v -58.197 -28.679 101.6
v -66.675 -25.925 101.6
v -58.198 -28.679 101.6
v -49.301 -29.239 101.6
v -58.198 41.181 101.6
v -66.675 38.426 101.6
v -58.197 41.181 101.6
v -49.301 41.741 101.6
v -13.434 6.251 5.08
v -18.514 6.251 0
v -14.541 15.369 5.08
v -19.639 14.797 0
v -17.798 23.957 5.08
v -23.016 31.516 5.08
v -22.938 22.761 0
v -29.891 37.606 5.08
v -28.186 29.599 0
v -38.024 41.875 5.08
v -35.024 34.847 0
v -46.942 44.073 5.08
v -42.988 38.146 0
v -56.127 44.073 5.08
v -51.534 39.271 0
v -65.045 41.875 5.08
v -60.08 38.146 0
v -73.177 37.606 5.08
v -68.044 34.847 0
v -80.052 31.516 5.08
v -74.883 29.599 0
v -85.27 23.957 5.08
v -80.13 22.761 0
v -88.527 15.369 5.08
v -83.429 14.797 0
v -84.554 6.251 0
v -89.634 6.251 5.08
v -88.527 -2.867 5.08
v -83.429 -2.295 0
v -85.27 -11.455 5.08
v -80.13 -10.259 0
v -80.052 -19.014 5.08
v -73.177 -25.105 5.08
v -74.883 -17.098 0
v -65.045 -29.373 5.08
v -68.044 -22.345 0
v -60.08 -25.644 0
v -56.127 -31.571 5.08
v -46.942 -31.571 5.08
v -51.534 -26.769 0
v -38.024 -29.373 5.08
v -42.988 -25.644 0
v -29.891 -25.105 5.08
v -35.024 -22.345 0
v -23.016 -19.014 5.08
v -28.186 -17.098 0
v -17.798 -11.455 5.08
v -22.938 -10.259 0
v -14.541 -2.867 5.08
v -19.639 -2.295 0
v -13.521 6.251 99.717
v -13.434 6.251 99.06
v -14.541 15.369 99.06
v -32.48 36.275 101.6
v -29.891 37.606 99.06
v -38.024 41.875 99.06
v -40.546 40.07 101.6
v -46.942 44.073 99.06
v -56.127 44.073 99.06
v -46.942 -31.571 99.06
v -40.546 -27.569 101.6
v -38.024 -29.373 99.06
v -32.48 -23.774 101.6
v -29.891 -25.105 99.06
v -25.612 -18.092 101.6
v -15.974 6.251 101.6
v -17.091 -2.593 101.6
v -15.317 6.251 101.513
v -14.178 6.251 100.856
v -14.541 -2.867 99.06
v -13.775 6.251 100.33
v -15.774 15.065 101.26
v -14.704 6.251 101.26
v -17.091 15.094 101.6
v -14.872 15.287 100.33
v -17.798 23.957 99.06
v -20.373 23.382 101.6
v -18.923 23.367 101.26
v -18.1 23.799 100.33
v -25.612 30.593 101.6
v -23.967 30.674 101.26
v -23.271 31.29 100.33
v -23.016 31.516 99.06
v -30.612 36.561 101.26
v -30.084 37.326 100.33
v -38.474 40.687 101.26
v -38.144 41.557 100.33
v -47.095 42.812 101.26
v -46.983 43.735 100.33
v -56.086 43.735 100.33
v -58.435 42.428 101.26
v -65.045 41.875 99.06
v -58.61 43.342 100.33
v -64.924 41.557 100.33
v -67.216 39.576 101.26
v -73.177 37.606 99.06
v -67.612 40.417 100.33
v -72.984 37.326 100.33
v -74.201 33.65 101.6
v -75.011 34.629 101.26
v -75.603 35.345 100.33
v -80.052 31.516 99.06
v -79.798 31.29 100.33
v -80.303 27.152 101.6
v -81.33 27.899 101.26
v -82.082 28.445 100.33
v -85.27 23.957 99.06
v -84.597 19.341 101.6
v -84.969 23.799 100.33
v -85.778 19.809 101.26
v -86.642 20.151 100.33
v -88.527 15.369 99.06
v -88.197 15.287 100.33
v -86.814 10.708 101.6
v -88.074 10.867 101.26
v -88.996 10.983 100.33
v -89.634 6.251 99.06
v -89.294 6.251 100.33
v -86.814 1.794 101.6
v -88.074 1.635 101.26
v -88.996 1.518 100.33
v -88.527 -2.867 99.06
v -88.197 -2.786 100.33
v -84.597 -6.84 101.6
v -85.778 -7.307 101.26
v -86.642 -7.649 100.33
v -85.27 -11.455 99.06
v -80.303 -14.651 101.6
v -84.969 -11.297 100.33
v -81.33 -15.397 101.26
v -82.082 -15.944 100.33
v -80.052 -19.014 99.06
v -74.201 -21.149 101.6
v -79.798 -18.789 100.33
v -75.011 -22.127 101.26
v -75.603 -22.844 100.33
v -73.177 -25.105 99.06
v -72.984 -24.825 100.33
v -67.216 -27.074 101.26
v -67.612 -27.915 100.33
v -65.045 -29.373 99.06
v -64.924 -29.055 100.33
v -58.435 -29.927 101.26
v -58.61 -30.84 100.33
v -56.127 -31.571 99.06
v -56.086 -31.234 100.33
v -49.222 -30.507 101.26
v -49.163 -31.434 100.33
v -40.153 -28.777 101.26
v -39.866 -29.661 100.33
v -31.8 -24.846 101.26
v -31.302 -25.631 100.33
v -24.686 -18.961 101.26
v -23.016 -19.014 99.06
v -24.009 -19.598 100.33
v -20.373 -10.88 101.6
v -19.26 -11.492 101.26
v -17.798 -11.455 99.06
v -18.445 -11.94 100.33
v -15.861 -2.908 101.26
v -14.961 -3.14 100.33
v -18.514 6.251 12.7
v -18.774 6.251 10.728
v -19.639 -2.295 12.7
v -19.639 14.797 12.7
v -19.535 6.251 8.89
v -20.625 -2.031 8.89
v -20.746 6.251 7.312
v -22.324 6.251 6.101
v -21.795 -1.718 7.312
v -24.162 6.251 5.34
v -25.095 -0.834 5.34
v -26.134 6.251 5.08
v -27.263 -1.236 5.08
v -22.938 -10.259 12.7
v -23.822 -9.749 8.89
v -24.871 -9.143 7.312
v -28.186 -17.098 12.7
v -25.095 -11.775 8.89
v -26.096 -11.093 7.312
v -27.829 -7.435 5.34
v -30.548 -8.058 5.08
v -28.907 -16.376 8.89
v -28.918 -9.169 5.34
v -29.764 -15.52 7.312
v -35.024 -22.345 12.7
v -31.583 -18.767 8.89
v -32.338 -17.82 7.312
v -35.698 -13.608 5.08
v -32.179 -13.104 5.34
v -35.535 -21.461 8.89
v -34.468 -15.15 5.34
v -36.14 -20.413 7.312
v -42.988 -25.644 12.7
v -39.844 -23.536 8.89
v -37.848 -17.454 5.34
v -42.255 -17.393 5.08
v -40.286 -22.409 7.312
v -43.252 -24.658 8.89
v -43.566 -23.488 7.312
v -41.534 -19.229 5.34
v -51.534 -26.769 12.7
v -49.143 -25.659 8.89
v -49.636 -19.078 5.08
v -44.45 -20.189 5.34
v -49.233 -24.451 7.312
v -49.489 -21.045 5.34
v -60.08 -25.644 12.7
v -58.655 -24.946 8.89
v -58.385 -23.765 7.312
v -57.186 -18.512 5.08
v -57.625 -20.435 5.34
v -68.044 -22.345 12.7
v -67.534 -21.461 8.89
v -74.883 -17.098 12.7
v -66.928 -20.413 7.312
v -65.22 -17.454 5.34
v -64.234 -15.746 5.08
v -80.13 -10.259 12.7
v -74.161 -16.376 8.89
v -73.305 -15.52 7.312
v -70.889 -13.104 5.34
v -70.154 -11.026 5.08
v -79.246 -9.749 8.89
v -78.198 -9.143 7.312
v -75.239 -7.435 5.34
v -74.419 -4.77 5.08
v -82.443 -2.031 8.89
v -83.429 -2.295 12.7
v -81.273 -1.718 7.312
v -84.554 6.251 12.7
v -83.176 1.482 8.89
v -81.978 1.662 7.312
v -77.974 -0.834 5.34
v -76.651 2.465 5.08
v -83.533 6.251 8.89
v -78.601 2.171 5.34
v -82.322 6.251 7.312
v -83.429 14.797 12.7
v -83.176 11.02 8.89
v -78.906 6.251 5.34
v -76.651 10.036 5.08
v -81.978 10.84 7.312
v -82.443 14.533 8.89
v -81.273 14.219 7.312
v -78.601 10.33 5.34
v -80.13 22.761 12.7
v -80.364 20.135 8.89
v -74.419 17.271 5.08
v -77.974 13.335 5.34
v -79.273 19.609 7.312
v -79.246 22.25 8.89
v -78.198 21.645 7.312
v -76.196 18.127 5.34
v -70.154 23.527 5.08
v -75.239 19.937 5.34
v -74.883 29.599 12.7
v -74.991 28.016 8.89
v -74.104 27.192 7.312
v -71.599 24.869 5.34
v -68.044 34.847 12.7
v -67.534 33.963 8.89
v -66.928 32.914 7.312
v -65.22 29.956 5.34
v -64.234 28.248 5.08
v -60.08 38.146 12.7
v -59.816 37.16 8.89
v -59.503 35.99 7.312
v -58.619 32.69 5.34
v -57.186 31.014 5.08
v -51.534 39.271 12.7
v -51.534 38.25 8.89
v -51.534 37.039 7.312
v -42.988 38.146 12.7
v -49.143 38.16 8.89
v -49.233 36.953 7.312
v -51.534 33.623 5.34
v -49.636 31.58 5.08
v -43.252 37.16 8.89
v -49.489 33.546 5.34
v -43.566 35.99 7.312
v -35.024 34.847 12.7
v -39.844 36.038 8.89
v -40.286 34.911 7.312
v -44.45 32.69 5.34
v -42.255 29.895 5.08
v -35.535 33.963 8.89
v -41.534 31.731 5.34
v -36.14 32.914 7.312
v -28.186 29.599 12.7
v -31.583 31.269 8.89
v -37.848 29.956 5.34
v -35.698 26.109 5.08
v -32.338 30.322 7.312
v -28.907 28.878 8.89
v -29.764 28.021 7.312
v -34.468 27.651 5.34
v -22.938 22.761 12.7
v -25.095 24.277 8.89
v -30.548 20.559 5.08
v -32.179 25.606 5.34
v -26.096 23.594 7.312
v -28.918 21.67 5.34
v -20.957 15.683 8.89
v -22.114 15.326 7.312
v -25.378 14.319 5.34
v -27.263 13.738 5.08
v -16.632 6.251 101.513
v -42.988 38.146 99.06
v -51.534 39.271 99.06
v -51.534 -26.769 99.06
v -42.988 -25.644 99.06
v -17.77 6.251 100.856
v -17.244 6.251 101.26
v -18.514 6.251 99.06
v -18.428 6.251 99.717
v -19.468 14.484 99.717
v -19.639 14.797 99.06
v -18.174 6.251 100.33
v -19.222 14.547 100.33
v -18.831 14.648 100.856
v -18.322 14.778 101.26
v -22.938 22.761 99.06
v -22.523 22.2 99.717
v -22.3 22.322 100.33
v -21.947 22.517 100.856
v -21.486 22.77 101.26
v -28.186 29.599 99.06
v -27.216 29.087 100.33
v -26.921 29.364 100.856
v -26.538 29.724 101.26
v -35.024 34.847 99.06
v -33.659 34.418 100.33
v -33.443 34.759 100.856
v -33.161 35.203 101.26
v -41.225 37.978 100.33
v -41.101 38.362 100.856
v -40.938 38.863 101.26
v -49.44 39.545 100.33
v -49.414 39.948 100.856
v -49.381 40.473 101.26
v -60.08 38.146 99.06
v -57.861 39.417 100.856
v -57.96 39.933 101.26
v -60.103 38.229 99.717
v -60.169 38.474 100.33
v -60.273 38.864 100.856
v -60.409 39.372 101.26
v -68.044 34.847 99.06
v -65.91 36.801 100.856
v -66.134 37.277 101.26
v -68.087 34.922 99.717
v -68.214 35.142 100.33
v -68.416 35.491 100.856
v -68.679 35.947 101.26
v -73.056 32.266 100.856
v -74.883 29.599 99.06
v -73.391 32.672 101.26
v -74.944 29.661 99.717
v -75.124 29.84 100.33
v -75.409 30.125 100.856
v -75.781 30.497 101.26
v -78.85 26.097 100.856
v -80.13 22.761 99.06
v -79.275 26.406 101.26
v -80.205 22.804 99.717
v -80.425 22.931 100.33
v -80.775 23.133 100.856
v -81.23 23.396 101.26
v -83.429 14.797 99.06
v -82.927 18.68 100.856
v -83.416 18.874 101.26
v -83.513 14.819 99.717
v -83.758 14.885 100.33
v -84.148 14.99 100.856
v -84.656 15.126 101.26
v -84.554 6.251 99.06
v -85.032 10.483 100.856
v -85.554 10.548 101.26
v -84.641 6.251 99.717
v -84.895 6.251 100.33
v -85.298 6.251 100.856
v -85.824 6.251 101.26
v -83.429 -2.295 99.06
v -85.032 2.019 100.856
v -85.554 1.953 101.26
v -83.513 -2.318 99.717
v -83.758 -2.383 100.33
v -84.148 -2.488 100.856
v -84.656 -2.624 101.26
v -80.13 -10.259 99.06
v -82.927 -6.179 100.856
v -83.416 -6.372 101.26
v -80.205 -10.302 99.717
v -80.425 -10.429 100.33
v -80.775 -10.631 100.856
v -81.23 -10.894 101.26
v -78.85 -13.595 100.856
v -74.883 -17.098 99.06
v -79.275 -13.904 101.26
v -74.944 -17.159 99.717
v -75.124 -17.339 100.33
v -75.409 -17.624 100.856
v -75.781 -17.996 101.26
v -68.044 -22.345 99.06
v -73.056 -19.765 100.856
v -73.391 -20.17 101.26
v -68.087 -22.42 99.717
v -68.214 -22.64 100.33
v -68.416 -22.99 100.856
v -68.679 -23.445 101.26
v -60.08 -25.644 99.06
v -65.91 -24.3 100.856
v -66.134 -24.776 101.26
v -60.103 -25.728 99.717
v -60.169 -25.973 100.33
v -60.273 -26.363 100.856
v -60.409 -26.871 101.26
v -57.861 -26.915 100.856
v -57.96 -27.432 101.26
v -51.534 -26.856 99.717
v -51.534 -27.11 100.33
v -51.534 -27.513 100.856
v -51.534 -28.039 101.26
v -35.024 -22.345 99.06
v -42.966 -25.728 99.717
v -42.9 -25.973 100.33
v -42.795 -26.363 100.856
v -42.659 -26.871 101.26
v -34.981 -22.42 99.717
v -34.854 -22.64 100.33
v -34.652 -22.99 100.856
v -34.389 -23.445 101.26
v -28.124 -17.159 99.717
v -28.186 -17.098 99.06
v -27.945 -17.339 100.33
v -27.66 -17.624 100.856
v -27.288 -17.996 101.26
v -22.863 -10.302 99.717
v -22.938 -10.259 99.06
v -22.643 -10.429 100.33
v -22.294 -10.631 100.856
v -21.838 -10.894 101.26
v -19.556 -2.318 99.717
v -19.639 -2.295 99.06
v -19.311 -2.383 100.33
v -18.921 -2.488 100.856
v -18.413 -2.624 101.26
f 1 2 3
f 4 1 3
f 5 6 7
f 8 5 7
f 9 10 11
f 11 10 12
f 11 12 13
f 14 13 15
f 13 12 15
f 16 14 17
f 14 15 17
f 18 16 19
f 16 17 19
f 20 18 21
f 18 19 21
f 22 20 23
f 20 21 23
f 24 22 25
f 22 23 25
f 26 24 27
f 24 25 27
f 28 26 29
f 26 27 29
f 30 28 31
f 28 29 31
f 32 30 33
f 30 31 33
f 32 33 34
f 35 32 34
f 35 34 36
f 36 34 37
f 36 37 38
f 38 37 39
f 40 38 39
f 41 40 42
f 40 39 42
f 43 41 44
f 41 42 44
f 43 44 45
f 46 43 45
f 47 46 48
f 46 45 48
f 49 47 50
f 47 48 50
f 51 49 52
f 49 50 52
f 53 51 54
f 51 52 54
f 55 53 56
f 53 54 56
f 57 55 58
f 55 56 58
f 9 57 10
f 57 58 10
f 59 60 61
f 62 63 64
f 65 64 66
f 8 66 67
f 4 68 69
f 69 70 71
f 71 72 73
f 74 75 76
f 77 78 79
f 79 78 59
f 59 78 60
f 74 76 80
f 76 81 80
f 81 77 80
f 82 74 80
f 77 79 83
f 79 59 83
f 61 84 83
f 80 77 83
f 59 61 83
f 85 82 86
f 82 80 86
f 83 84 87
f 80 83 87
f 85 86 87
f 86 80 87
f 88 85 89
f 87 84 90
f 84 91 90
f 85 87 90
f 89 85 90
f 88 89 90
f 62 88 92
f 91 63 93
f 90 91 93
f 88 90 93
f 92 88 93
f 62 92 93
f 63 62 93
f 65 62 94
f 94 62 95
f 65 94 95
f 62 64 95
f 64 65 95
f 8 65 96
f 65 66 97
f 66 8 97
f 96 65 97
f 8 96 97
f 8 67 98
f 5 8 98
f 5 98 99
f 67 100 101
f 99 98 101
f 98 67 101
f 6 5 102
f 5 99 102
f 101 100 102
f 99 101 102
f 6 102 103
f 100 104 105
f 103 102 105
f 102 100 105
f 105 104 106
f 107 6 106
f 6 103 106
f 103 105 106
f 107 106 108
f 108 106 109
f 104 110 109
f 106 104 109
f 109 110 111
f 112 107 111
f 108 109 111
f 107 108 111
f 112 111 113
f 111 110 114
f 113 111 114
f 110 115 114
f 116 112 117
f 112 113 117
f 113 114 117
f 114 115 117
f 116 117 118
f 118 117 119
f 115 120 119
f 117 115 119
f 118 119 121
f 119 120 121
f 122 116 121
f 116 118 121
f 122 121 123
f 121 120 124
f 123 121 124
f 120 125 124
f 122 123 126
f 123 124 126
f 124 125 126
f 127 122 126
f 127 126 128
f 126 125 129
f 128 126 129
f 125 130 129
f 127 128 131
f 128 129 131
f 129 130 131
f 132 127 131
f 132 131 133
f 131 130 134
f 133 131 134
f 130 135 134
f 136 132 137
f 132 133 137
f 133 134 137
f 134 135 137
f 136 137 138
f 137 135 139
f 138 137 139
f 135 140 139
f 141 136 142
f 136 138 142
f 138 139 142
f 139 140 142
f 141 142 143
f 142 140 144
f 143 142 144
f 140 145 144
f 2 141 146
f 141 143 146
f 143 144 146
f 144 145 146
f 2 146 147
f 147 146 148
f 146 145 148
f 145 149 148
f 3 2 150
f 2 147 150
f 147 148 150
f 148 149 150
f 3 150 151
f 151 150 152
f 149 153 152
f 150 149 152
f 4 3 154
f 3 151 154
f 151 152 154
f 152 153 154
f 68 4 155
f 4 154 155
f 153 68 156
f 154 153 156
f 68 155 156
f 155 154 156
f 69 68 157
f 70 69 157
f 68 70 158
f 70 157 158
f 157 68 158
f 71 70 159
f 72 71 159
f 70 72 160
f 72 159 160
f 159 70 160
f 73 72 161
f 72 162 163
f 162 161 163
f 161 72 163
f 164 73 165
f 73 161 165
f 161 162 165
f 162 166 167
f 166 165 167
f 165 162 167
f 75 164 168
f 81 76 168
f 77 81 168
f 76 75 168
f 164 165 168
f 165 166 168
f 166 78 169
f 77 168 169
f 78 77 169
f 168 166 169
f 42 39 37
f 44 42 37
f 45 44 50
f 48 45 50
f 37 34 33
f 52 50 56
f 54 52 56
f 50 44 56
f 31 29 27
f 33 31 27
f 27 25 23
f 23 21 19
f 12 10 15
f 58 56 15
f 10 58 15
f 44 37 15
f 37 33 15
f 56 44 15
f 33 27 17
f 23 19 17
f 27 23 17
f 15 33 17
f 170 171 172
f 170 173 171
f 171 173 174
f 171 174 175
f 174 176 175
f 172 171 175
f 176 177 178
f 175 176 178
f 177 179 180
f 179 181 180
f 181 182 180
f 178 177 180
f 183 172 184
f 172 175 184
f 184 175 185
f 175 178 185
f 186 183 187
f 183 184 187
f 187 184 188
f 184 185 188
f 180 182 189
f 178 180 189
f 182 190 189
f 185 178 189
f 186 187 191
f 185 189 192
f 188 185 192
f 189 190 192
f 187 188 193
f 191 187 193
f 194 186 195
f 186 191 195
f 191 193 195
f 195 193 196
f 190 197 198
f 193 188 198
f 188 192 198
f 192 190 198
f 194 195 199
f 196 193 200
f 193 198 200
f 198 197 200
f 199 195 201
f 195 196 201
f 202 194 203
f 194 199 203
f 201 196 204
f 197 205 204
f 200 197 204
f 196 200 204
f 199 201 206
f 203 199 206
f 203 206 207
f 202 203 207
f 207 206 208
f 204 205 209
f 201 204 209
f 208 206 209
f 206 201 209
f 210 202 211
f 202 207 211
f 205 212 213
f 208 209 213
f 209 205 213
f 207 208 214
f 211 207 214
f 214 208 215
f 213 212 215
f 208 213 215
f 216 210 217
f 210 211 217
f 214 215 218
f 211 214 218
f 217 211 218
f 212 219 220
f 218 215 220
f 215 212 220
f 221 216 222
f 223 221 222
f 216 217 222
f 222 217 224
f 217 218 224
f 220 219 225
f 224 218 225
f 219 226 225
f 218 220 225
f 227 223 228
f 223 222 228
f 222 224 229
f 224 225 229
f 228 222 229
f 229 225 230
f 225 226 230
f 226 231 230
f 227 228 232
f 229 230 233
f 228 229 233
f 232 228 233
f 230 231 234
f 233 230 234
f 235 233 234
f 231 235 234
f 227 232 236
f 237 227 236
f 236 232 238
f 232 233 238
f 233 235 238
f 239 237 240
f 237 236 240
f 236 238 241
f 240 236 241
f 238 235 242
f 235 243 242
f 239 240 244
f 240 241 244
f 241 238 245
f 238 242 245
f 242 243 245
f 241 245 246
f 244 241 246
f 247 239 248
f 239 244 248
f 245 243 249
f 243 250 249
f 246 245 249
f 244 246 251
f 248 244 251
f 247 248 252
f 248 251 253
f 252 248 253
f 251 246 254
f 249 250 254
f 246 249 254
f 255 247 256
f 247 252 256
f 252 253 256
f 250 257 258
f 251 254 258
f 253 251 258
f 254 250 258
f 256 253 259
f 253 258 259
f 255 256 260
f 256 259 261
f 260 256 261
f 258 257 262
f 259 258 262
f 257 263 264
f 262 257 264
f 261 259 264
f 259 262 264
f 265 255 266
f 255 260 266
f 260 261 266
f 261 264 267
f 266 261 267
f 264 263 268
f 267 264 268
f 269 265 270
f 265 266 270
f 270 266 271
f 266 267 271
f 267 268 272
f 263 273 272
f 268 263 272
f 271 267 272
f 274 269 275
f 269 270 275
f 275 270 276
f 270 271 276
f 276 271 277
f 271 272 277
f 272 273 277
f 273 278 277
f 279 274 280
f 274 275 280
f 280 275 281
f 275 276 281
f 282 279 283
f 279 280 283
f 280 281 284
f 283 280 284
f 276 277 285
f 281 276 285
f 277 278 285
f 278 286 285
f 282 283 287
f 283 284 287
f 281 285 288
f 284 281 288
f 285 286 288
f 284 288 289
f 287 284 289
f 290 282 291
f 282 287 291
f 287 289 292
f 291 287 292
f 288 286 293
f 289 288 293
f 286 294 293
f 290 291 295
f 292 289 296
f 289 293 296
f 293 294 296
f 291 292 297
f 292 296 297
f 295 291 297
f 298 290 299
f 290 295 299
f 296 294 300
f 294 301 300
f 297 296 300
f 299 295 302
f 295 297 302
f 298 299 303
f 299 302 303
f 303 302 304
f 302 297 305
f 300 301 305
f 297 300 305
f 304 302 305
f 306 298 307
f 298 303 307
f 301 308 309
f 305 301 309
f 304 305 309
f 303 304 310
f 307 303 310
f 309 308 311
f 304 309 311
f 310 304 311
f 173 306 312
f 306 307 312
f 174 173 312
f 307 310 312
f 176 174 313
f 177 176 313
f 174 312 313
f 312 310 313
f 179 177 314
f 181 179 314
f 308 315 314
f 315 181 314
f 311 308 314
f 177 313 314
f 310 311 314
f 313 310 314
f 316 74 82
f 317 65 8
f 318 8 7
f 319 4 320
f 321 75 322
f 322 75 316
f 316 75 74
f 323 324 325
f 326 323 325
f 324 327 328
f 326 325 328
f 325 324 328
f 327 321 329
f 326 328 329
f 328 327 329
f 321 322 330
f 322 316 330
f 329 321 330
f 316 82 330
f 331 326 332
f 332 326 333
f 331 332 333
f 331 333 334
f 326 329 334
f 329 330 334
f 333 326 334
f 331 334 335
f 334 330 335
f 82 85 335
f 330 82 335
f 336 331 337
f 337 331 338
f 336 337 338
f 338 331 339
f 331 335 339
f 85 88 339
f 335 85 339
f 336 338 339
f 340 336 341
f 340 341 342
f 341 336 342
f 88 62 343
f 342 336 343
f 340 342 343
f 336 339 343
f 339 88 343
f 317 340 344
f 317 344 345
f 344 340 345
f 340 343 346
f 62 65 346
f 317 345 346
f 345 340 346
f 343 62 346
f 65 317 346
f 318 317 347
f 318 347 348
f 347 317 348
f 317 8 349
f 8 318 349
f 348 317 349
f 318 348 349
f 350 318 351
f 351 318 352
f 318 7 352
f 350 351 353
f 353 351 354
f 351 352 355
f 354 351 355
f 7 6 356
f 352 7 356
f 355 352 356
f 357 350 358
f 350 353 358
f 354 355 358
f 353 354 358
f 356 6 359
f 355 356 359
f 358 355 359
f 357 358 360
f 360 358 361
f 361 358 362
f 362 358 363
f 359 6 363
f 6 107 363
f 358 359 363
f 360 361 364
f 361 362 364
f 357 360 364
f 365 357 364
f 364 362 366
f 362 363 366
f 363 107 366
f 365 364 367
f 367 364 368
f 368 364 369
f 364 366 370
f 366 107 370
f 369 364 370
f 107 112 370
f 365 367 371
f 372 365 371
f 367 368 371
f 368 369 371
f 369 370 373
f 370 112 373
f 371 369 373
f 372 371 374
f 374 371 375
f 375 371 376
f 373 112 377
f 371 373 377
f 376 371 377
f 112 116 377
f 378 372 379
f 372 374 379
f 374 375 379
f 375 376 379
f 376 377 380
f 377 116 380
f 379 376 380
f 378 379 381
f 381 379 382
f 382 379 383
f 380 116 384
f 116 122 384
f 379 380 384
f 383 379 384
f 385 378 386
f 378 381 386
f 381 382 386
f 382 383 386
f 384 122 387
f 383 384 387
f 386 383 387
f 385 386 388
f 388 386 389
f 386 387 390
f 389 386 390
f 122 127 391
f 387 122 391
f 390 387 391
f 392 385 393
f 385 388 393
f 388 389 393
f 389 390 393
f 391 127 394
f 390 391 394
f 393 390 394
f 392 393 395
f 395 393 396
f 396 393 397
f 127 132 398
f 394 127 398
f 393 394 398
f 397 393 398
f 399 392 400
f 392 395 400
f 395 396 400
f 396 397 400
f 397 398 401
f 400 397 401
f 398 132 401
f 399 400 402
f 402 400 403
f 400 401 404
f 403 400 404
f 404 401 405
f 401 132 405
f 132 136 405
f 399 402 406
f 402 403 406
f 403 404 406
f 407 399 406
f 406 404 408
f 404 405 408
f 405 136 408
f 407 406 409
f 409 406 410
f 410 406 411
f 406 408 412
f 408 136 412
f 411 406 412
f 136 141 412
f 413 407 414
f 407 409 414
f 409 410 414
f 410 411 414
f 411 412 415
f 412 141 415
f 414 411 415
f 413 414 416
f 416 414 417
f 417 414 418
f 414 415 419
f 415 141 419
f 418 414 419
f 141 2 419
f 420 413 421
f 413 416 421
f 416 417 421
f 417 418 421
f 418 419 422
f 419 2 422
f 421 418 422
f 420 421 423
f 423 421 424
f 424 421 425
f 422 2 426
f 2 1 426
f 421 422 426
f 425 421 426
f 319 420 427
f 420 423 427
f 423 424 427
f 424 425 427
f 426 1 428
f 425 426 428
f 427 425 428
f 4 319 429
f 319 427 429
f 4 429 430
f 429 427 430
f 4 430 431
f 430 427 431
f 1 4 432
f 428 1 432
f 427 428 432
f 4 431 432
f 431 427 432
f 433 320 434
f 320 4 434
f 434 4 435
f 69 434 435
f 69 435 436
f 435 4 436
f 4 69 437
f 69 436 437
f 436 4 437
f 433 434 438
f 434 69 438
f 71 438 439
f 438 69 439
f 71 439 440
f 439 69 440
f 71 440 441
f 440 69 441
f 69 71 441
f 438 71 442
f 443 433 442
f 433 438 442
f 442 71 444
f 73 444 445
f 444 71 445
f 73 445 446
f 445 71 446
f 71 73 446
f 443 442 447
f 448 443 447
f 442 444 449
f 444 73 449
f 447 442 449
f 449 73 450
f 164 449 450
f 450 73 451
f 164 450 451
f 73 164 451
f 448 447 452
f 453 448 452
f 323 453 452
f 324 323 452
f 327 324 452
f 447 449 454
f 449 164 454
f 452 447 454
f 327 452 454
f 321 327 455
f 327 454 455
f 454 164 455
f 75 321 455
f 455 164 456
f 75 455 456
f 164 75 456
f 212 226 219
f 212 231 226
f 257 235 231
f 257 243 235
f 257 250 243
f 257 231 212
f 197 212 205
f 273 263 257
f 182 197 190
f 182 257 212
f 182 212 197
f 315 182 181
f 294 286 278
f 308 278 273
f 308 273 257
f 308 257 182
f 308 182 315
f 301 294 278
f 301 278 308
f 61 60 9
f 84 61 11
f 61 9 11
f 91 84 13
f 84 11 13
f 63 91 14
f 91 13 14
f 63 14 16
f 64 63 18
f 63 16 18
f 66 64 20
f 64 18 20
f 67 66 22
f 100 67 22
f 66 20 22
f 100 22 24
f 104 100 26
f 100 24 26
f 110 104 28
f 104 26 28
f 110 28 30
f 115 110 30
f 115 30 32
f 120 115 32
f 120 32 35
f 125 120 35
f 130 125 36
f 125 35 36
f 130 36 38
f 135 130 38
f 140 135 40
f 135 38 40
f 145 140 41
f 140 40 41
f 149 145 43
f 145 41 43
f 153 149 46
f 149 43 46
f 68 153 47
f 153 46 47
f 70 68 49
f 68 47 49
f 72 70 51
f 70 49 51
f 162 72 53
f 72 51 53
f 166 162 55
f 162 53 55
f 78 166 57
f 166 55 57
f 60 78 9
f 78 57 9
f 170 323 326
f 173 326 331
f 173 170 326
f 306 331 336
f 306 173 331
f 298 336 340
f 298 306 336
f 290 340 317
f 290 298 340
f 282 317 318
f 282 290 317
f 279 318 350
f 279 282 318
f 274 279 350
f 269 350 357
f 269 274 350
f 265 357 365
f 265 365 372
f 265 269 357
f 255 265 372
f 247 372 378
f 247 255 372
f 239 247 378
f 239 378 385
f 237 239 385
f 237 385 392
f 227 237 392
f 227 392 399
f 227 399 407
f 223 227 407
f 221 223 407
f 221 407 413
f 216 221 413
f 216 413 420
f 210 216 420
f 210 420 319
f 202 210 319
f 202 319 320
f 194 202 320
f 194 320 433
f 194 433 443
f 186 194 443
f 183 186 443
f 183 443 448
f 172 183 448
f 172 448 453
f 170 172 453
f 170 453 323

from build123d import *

# Parameters (mm, degrees)
F0_R     = 38.1
F1_DEPTH = 101.6
F2_T     = -5.08
F3_R     = 7.62
F4_R     = 2.53999
F5_SIZE  = 5.08


# Not quite as in the source:
# - a fillet or chamfer is up to 0.001 mm smaller than in the source, because OpenCascade refuses the exact size


with BuildPart() as f1:
    # F0 (on Top) → F1 (new body)
    with BuildSketch(Plane.XY):
        with Locations((-51.5342205763, 6.2507814728)):
            Circle(F0_R)
    extrude(amount=F1_DEPTH)

    # F2
    f2_openings = [f1.faces().sort_by_distance(p)[0] for p in [
        (-51.534221, 6.250781, 101.6),
    ]]
    offset(amount=F2_T, openings=f2_openings)

    # F3
    f3_edges = [f1.edges().sort_by_distance(p)[0] for p in [
        (-84.554221, 6.250781, 5.08),
    ]]
    fillet(f3_edges, radius=F3_R)

    # F4 (radius 2.54 in the source; OpenCascade refuses exactly that, so slightly less here)
    f4_edges = [f1.edges().sort_by_distance(p)[0] for p in [
        (-84.554221, 6.250781, 101.6),
        (-89.634221, 6.250781, 101.6),
    ]]
    fillet(f4_edges, radius=F4_R)

    # F5
    f5_edges = [f1.edges().sort_by_distance(p)[0] for p in [
        (-89.634221, 6.250781, 0),
    ]]
    chamfer(f5_edges, length=F5_SIZE)


solid = f1.part
